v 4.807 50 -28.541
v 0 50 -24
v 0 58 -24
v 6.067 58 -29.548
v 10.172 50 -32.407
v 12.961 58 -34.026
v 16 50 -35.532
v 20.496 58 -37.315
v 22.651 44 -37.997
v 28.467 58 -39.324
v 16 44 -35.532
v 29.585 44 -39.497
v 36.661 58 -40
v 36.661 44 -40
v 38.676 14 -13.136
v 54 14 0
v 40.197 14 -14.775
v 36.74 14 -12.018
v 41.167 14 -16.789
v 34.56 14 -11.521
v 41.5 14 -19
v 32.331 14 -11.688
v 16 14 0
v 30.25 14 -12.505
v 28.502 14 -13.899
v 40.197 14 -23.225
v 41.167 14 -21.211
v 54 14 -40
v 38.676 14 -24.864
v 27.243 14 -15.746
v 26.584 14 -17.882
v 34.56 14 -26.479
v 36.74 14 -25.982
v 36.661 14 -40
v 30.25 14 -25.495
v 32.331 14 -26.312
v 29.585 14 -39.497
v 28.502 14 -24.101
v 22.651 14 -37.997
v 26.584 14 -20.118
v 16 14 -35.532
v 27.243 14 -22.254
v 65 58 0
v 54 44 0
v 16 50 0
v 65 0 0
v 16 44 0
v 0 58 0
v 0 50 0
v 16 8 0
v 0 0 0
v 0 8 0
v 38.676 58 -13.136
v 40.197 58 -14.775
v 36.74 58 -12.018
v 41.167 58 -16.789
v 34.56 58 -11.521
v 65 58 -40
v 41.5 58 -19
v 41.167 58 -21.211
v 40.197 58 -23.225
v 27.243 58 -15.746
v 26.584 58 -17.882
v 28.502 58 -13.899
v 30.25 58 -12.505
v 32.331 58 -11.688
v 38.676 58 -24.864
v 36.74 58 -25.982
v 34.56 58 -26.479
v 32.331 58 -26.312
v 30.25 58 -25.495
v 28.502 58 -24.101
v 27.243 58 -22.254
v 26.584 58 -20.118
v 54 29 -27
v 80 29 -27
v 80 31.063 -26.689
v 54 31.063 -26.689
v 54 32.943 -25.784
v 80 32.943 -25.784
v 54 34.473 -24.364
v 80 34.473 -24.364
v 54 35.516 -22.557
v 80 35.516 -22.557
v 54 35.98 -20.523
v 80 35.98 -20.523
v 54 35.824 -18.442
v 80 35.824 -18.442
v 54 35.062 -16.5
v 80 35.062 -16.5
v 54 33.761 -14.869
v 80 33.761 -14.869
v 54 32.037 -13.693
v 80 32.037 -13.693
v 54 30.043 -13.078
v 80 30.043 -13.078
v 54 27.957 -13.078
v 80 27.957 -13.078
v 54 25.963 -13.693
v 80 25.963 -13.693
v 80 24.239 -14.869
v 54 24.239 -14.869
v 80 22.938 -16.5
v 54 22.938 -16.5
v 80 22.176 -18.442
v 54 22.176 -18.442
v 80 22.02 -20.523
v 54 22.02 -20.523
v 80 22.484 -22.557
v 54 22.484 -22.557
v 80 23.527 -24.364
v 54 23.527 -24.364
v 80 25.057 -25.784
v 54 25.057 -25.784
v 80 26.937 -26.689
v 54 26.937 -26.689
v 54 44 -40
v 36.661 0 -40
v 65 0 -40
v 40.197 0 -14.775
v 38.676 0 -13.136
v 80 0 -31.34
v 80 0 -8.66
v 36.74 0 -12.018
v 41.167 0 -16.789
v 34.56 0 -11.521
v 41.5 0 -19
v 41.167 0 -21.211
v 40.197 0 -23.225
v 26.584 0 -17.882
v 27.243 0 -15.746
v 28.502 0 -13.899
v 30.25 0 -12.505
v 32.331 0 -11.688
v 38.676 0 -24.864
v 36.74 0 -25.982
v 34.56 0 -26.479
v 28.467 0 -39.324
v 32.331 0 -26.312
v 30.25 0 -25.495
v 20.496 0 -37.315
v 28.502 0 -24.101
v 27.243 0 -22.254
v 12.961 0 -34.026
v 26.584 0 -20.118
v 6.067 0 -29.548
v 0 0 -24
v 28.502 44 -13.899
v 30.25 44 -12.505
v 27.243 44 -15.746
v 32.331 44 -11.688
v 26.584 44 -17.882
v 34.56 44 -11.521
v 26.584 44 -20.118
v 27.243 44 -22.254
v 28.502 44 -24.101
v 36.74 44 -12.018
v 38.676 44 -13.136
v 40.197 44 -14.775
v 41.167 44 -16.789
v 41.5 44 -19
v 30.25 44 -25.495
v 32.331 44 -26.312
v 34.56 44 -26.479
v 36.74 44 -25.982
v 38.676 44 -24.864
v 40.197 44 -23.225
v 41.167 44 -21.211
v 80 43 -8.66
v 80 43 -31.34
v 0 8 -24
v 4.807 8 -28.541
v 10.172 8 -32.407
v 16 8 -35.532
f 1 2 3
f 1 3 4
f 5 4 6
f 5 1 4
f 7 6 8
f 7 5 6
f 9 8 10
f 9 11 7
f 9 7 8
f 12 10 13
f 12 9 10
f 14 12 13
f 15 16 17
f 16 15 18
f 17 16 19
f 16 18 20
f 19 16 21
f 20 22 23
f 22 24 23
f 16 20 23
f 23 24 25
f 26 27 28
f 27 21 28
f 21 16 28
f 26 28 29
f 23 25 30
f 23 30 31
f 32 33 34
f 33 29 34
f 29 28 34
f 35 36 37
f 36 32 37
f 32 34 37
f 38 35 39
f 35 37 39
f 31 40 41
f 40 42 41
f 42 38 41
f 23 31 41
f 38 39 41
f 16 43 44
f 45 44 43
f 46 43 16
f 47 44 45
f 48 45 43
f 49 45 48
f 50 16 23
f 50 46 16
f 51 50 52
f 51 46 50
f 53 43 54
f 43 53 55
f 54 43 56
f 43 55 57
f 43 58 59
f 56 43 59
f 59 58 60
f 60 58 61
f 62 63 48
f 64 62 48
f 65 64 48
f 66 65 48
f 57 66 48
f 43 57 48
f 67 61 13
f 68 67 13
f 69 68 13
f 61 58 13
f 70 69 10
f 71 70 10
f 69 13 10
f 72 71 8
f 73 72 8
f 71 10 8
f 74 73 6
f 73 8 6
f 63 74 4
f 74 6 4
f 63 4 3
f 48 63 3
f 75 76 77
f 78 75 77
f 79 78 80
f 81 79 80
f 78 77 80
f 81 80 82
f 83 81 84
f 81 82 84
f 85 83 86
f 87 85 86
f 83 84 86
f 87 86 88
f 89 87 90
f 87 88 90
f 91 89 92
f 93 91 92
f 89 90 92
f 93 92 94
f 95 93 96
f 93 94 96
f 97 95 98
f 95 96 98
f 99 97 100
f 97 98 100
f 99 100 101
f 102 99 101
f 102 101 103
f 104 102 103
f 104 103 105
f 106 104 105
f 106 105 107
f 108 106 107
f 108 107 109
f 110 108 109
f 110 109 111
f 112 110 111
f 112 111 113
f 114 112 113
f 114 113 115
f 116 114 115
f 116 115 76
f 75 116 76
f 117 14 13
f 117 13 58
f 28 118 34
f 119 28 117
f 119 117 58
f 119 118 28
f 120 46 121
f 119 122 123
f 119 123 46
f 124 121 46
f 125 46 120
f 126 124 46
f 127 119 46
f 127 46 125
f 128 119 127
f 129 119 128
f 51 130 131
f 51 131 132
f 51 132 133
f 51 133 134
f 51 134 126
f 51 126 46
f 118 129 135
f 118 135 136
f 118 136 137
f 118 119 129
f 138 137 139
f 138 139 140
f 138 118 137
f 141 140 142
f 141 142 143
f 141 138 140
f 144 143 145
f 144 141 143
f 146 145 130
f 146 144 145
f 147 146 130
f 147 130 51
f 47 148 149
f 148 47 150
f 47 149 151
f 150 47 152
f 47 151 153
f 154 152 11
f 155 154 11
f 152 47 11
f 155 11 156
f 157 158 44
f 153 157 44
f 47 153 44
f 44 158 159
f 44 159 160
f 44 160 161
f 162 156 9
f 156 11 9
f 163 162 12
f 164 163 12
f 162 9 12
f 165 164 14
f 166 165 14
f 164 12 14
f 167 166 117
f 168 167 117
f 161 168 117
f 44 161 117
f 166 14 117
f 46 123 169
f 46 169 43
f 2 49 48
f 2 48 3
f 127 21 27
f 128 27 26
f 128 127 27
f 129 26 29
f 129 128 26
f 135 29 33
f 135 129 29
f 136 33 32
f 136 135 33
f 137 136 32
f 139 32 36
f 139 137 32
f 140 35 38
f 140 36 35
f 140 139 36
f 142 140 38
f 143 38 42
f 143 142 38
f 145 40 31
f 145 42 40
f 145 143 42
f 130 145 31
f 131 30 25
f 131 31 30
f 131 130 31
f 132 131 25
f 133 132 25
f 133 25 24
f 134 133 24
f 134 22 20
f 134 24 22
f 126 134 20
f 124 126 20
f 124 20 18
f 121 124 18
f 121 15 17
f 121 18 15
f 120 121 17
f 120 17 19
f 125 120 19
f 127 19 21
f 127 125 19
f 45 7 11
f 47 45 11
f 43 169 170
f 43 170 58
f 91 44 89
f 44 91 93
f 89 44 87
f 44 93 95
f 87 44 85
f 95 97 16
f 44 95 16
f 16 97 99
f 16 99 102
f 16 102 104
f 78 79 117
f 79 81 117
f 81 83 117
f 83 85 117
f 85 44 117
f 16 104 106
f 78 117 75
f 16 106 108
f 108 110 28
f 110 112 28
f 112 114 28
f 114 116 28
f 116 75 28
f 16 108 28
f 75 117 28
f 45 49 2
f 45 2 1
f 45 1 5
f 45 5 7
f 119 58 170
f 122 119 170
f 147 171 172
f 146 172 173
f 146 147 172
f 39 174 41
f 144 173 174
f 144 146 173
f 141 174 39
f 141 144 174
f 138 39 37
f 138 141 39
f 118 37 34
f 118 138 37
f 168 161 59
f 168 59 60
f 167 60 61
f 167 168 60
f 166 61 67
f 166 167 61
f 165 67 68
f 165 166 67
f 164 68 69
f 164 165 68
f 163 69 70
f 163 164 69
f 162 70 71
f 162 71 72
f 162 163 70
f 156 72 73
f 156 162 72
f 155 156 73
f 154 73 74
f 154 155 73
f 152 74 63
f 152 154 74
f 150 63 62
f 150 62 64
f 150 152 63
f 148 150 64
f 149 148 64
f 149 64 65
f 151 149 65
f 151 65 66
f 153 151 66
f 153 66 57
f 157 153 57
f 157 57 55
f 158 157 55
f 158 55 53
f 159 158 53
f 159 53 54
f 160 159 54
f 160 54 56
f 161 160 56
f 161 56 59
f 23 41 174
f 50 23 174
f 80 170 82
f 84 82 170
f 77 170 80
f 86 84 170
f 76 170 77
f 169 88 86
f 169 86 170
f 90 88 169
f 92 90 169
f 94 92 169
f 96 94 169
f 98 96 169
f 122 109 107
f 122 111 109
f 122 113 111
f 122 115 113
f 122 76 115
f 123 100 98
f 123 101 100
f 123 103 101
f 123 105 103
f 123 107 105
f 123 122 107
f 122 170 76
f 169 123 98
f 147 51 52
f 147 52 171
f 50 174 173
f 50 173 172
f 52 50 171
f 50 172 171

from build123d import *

# Parameters (mm, degrees)
SKETCH1_R           = 7.5
BOSS_EXTRUDE1_DEPTH = 58
CUT_EXTRUDE1_DEPTH  = 58
CUT_EXTRUDE2_DEPTH  = 58
CUT_EXTRUDE3_REACH  = 82
SKETCH4_R           = 7


with BuildPart() as part:
    # Sketch1 → Boss-Extrude1 (new body)
    with BuildSketch(Plane(origin=(0, 0, 0), x_dir=(1, 0, 0), z_dir=(0, 1, 0))):
        with BuildLine():
            Line((36.66060556, 40), (65, 40))
            Line((65, 40), (80, 31.339745962))
            Line((80, 31.339745962), (80, 8.660254038))
            Line((80, 8.660254038), (65, 0))
            Line((65, 0), (0, 0))
            Line((0, 0), (0, 24))
            ThreePointArc((0, 24), (16.66060556, 35.82575695), (36.66060556, 40))
        make_face()
        with Locations((34, 19)):
            Circle(SKETCH1_R, mode=Mode.SUBTRACT)
    extrude(amount=BOSS_EXTRUDE1_DEPTH)

    # Sketch2 → Cut-Extrude1 (cut)
    with BuildSketch(Plane(origin=(0, 0, -40), x_dir=(-1, 0, 0), z_dir=(0, 0, -1))):
        Polygon((0, 50), (-16, 50), (-16, 44), (-54, 44), (-54, 14), (-16, 14), (-16, 8), (0, 8), align=None)
    extrude(amount=-CUT_EXTRUDE1_DEPTH, mode=Mode.SUBTRACT)

    # Sketch3 → Cut-Extrude2 (cut)
    with BuildSketch(Plane(origin=(0, 0, -40), x_dir=(-1, 0, 0), z_dir=(0, 0, -1))):
        Polygon((-80, 58), (-80, 43), (-65, 58), align=None)
    extrude(amount=-CUT_EXTRUDE2_DEPTH, mode=Mode.SUBTRACT)

    # Sketch4 → Cut-Extrude3 (cut, up to next)
    with BuildSketch(Plane(origin=(80, 0, 0), x_dir=(0, 0, -1), z_dir=(1, 0, 0)), mode=Mode.PRIVATE) as cut_extrude3_sk1:
        with Locations((20, 29)):
            Circle(SKETCH4_R)
    cut_extrude3_tool1 = extrude(cut_extrude3_sk1.sketch, amount=-CUT_EXTRUDE3_REACH, mode=Mode.PRIVATE) & part.part
    add(cut_extrude3_tool1.solids().sort_by_distance((80, 29, -20))[0], mode=Mode.SUBTRACT)


solid = part.part
